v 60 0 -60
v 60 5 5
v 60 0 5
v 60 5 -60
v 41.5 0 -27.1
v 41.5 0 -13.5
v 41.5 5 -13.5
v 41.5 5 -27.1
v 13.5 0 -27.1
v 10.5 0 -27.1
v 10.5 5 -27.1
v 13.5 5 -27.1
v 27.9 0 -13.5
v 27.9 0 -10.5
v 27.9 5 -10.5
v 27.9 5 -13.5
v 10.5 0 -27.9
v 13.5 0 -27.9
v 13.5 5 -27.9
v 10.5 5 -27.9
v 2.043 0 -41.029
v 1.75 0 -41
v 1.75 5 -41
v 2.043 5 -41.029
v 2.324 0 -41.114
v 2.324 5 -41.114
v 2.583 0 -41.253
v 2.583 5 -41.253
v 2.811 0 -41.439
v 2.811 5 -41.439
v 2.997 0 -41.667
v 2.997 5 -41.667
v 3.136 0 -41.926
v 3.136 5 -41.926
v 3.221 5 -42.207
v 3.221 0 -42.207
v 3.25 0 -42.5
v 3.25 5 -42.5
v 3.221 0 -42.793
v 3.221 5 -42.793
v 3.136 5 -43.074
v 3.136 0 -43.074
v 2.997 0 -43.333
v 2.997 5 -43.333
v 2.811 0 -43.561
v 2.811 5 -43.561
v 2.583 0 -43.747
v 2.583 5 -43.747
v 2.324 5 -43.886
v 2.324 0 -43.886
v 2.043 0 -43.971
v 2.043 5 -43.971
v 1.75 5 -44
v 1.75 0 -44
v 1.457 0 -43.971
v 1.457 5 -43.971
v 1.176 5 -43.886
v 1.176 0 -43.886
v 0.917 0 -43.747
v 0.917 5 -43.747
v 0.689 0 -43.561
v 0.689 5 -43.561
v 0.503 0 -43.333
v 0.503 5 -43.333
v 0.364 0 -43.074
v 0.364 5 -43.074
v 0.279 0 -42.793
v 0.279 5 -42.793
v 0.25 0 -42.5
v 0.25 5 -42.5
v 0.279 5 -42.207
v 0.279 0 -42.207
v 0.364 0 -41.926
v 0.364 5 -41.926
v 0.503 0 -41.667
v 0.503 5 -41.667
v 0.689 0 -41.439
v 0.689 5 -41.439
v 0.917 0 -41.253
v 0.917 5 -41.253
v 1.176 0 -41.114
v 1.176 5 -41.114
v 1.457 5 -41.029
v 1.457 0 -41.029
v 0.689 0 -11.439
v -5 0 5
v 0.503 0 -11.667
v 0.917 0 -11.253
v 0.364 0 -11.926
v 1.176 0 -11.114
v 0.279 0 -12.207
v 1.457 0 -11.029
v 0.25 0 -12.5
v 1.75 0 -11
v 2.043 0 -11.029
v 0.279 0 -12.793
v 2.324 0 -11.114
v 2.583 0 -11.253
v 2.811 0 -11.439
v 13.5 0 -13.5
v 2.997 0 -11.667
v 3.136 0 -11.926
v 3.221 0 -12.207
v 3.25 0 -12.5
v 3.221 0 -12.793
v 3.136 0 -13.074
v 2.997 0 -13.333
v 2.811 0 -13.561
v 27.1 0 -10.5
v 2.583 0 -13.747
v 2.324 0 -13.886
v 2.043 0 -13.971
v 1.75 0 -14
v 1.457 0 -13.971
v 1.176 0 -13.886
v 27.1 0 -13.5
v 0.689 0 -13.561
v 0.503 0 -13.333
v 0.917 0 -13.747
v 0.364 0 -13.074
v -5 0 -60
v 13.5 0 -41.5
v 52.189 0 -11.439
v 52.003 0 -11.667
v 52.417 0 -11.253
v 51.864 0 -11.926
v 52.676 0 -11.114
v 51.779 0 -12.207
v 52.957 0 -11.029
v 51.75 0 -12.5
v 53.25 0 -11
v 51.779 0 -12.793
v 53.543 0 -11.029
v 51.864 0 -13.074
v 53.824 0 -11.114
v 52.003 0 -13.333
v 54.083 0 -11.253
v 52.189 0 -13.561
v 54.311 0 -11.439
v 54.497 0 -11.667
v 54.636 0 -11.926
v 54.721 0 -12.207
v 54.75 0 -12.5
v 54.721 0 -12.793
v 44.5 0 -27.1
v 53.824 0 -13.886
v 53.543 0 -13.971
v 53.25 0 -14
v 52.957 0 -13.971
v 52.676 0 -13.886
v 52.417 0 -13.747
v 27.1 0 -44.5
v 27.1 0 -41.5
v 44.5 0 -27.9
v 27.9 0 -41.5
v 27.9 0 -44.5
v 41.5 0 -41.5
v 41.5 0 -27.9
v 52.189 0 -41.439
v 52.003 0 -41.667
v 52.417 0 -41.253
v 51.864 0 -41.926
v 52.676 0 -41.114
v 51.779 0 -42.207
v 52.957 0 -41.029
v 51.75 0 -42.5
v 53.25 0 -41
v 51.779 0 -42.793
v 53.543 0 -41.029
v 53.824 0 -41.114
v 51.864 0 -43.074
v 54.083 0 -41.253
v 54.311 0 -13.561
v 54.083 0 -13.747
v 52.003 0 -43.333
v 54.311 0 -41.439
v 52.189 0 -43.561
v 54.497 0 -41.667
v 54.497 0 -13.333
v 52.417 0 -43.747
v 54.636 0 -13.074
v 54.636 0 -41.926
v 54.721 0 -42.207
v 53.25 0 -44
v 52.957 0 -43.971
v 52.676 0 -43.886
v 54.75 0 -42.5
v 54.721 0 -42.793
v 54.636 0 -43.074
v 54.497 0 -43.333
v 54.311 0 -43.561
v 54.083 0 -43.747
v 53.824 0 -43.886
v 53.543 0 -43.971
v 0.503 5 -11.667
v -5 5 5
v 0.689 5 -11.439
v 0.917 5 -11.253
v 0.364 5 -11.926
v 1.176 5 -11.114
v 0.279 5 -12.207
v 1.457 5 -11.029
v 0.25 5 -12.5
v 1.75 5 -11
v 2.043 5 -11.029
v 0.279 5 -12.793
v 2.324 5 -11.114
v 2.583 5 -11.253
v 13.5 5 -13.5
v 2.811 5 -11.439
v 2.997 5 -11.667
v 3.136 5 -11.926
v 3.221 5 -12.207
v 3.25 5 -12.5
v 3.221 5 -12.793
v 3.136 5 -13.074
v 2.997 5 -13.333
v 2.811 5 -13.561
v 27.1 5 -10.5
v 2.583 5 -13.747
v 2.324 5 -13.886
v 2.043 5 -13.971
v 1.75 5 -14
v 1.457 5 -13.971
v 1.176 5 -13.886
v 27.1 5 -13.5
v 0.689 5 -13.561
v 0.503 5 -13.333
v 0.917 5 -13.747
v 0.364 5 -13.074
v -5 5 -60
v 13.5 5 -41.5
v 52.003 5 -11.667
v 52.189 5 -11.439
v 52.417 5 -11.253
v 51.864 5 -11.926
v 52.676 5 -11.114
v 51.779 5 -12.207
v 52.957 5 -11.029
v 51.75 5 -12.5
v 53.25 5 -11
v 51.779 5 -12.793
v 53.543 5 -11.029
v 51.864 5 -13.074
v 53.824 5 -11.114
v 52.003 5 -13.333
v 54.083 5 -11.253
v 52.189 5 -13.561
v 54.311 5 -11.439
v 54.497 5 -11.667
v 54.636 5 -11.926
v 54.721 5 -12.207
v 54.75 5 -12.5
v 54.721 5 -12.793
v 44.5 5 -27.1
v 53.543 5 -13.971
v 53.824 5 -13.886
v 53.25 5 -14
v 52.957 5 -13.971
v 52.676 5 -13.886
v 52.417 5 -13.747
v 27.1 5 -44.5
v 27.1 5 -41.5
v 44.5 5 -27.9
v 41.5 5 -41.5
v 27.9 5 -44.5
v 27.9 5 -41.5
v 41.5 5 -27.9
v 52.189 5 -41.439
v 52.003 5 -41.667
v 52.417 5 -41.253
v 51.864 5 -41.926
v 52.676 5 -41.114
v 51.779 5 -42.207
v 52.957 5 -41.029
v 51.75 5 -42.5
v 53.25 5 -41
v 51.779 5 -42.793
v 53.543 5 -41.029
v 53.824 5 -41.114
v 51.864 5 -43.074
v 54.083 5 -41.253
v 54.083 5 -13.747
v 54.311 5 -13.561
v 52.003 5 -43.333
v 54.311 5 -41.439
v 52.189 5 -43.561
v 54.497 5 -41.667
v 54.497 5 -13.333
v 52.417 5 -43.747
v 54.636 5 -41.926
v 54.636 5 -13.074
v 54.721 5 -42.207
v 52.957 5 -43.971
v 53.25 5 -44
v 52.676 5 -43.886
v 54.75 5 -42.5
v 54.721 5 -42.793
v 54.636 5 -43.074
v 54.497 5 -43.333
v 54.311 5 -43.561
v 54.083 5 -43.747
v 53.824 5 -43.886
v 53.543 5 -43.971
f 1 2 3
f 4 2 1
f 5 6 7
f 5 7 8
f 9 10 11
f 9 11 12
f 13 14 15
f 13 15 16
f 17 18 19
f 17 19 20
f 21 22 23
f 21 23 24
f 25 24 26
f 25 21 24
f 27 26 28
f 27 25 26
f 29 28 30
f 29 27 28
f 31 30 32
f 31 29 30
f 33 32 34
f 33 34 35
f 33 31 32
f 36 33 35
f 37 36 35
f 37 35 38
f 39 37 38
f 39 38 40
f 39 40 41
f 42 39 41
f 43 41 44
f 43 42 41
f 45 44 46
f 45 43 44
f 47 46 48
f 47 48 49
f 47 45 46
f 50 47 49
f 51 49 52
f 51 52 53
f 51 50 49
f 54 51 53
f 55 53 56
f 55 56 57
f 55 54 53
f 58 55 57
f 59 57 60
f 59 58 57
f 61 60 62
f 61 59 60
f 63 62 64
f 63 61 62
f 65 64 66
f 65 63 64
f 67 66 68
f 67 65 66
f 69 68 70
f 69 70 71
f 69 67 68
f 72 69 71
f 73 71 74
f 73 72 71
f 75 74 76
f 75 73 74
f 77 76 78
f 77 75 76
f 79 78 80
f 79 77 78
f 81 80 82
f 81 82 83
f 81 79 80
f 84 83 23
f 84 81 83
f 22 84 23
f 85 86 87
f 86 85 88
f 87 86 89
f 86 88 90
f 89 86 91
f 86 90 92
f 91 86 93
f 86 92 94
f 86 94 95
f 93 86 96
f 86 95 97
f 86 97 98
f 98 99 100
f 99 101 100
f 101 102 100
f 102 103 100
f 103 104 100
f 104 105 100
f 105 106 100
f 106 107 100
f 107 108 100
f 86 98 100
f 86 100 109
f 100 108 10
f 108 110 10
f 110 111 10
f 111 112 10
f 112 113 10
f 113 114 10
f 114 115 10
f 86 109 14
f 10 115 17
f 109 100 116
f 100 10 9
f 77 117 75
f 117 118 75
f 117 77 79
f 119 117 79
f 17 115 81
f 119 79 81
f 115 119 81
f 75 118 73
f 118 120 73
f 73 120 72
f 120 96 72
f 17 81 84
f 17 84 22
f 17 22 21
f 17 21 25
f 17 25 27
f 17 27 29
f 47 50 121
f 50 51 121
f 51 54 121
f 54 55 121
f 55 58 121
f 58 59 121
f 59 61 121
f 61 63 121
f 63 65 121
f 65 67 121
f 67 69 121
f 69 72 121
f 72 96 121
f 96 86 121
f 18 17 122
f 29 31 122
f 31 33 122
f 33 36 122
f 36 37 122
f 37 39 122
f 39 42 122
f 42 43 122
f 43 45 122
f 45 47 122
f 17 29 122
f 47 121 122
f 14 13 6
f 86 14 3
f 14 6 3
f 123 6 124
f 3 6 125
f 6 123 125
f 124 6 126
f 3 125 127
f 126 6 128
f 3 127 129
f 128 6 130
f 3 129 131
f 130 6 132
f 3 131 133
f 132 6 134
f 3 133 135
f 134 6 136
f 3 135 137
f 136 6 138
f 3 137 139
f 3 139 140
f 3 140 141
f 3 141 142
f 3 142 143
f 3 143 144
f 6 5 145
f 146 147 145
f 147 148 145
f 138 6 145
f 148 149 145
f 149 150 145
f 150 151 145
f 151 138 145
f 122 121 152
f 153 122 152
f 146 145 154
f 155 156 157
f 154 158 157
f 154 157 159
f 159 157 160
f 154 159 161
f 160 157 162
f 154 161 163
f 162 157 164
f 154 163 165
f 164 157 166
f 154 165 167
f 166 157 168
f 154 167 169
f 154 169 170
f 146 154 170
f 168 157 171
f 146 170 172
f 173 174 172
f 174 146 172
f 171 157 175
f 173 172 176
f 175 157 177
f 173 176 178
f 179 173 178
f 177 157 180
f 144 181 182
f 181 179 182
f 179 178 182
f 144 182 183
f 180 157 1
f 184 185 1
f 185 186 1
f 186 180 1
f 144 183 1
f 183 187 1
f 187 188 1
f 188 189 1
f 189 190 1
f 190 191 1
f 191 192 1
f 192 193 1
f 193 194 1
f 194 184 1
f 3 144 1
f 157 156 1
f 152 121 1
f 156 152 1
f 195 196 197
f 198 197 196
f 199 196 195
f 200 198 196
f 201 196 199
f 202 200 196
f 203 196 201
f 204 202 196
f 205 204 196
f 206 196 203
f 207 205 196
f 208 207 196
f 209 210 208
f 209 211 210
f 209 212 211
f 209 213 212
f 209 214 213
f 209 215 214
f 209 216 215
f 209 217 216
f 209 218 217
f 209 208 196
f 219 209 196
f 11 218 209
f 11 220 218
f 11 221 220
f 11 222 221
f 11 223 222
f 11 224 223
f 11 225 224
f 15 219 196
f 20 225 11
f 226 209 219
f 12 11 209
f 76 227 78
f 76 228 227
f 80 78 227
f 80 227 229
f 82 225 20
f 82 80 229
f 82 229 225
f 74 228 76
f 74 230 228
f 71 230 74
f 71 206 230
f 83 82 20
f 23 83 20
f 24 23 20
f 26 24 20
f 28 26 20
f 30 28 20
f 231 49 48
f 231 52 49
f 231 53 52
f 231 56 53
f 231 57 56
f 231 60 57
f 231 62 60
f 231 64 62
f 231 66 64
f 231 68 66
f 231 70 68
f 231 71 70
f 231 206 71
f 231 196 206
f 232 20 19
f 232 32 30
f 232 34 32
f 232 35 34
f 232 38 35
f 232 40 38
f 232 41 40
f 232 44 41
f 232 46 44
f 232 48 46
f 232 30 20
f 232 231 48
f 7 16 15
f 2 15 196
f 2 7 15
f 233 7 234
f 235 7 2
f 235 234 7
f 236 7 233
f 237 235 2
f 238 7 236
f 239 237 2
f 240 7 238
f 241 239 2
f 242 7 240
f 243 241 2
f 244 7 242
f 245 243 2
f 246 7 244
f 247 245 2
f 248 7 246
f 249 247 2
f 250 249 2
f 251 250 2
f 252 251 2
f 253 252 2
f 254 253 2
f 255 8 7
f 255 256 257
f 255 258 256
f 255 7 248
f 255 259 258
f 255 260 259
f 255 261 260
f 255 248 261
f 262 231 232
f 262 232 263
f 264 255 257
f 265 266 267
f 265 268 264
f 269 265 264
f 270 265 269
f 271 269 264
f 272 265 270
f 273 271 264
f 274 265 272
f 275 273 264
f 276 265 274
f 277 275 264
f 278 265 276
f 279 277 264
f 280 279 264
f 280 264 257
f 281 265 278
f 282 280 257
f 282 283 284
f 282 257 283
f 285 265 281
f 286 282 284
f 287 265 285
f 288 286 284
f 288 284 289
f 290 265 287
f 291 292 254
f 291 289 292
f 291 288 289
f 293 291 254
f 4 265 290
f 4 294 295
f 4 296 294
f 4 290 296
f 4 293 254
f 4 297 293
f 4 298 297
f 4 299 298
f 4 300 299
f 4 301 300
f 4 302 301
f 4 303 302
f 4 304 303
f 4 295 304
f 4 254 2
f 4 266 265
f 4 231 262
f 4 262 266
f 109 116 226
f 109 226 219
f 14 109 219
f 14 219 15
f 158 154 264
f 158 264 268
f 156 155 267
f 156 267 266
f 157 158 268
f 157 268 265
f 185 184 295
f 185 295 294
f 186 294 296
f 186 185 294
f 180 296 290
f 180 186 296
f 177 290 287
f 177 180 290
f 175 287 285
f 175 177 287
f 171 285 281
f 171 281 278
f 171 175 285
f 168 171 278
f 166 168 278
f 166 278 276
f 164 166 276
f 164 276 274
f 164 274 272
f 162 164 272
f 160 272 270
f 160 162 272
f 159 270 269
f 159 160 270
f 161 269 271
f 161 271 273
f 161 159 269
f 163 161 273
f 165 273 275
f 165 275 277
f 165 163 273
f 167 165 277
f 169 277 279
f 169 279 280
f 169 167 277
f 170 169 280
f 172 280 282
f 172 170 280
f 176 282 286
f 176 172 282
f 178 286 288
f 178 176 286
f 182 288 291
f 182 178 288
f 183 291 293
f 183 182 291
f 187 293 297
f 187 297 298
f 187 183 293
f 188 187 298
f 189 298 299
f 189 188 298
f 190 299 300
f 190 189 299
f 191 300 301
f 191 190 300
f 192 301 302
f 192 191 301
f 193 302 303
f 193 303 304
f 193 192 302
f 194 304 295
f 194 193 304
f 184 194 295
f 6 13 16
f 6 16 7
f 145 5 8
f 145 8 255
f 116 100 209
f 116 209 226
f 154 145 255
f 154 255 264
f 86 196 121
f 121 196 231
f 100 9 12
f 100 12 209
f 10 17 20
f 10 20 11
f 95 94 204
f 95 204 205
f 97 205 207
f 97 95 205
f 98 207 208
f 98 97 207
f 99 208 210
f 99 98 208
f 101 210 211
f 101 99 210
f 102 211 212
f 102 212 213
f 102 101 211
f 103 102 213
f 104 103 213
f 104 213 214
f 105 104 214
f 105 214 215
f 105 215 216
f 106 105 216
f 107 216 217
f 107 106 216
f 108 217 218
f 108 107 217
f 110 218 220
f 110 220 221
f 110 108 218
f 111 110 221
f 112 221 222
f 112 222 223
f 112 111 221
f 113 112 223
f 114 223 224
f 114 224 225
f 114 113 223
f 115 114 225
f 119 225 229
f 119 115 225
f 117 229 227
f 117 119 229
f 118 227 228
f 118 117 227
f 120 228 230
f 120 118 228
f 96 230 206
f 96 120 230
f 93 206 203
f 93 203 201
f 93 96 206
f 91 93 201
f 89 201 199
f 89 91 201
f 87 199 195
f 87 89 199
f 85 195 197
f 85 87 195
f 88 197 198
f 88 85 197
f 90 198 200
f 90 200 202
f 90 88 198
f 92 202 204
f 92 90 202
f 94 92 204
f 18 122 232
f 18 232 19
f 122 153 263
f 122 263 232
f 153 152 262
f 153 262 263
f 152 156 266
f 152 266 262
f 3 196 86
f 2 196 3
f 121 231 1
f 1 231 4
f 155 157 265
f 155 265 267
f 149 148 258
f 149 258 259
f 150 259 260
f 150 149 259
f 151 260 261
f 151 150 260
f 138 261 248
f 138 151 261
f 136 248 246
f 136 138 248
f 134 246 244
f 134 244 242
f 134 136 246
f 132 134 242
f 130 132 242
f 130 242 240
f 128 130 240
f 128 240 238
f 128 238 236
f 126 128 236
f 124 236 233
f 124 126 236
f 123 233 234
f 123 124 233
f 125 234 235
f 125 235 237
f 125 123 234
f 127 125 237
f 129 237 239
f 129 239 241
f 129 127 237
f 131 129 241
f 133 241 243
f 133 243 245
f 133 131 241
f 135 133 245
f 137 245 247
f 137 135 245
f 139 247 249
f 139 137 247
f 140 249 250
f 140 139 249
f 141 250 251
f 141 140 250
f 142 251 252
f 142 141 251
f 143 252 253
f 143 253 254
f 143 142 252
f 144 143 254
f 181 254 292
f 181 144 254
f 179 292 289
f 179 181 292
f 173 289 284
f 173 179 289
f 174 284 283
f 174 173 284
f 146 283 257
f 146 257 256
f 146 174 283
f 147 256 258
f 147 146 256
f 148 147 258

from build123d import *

# Parameters (mm, degrees)
CROQUIS1_W              = 55
CROQUIS1_H              = 55
CROQUIS1_R              = 1.5
SALIENTE_EXTRUIR1_DEPTH = 5
CROQUIS2_W              = 65
CROQUIS2_H              = 65
CROQUIS2_W_2            = 55
CROQUIS2_H_2            = 55
SALIENTE_EXTRUIR2_DEPTH = 5


with BuildPart() as part:
    # Croquis1 → Saliente-Extruir1 (new body)
    with BuildSketch(Plane(origin=(0, 0, 0), x_dir=(1, 0, 0), z_dir=(0, 1, 0))):
        with Locations((27.5, 27.5)):
            Rectangle(CROQUIS1_W, CROQUIS1_H)
        with Locations(Location((1.75, 42.5, 0), (0, 0, 270))):
            Circle(CROQUIS1_R, mode=Mode.SUBTRACT)
        with Locations(Location((1.75, 12.5, 0), (0, 0, 270))):
            Circle(CROQUIS1_R, mode=Mode.SUBTRACT)
        with Locations(Location((53.25, 42.5, 0), (0, 0, 90))):
            Circle(CROQUIS1_R, mode=Mode.SUBTRACT)
        with Locations(Location((53.25, 12.5, 0), (0, 0, 90))):
            Circle(CROQUIS1_R, mode=Mode.SUBTRACT)
        Polygon((13.5, 13.5), (27.1, 13.5), (27.1, 10.5), (27.9, 10.5), (27.9, 13.5), (41.5, 13.5), (41.5, 27.1), (44.5, 27.1), (44.5, 27.9), (41.5, 27.9), (41.5, 41.5), (27.9, 41.5), (27.9, 44.5), (27.1, 44.5), (27.1, 41.5), (13.5, 41.5), (13.5, 27.9), (10.5, 27.9), (10.5, 27.1), (13.5, 27.1), align=None, mode=Mode.SUBTRACT)
    extrude(amount=SALIENTE_EXTRUIR1_DEPTH)

    # Croquis2 → Saliente-Extruir2 (add)
    with BuildSketch(Plane(origin=(0, 5, 0), x_dir=(1, 0, 0), z_dir=(0, 1, 0))):
        with Locations((27.5, 27.5)):
            Rectangle(CROQUIS2_W, CROQUIS2_H)
        with Locations((27.5, 27.5)):
            Rectangle(CROQUIS2_W_2, CROQUIS2_H_2, mode=Mode.SUBTRACT)
    extrude(amount=-SALIENTE_EXTRUIR2_DEPTH)


solid = part.part
